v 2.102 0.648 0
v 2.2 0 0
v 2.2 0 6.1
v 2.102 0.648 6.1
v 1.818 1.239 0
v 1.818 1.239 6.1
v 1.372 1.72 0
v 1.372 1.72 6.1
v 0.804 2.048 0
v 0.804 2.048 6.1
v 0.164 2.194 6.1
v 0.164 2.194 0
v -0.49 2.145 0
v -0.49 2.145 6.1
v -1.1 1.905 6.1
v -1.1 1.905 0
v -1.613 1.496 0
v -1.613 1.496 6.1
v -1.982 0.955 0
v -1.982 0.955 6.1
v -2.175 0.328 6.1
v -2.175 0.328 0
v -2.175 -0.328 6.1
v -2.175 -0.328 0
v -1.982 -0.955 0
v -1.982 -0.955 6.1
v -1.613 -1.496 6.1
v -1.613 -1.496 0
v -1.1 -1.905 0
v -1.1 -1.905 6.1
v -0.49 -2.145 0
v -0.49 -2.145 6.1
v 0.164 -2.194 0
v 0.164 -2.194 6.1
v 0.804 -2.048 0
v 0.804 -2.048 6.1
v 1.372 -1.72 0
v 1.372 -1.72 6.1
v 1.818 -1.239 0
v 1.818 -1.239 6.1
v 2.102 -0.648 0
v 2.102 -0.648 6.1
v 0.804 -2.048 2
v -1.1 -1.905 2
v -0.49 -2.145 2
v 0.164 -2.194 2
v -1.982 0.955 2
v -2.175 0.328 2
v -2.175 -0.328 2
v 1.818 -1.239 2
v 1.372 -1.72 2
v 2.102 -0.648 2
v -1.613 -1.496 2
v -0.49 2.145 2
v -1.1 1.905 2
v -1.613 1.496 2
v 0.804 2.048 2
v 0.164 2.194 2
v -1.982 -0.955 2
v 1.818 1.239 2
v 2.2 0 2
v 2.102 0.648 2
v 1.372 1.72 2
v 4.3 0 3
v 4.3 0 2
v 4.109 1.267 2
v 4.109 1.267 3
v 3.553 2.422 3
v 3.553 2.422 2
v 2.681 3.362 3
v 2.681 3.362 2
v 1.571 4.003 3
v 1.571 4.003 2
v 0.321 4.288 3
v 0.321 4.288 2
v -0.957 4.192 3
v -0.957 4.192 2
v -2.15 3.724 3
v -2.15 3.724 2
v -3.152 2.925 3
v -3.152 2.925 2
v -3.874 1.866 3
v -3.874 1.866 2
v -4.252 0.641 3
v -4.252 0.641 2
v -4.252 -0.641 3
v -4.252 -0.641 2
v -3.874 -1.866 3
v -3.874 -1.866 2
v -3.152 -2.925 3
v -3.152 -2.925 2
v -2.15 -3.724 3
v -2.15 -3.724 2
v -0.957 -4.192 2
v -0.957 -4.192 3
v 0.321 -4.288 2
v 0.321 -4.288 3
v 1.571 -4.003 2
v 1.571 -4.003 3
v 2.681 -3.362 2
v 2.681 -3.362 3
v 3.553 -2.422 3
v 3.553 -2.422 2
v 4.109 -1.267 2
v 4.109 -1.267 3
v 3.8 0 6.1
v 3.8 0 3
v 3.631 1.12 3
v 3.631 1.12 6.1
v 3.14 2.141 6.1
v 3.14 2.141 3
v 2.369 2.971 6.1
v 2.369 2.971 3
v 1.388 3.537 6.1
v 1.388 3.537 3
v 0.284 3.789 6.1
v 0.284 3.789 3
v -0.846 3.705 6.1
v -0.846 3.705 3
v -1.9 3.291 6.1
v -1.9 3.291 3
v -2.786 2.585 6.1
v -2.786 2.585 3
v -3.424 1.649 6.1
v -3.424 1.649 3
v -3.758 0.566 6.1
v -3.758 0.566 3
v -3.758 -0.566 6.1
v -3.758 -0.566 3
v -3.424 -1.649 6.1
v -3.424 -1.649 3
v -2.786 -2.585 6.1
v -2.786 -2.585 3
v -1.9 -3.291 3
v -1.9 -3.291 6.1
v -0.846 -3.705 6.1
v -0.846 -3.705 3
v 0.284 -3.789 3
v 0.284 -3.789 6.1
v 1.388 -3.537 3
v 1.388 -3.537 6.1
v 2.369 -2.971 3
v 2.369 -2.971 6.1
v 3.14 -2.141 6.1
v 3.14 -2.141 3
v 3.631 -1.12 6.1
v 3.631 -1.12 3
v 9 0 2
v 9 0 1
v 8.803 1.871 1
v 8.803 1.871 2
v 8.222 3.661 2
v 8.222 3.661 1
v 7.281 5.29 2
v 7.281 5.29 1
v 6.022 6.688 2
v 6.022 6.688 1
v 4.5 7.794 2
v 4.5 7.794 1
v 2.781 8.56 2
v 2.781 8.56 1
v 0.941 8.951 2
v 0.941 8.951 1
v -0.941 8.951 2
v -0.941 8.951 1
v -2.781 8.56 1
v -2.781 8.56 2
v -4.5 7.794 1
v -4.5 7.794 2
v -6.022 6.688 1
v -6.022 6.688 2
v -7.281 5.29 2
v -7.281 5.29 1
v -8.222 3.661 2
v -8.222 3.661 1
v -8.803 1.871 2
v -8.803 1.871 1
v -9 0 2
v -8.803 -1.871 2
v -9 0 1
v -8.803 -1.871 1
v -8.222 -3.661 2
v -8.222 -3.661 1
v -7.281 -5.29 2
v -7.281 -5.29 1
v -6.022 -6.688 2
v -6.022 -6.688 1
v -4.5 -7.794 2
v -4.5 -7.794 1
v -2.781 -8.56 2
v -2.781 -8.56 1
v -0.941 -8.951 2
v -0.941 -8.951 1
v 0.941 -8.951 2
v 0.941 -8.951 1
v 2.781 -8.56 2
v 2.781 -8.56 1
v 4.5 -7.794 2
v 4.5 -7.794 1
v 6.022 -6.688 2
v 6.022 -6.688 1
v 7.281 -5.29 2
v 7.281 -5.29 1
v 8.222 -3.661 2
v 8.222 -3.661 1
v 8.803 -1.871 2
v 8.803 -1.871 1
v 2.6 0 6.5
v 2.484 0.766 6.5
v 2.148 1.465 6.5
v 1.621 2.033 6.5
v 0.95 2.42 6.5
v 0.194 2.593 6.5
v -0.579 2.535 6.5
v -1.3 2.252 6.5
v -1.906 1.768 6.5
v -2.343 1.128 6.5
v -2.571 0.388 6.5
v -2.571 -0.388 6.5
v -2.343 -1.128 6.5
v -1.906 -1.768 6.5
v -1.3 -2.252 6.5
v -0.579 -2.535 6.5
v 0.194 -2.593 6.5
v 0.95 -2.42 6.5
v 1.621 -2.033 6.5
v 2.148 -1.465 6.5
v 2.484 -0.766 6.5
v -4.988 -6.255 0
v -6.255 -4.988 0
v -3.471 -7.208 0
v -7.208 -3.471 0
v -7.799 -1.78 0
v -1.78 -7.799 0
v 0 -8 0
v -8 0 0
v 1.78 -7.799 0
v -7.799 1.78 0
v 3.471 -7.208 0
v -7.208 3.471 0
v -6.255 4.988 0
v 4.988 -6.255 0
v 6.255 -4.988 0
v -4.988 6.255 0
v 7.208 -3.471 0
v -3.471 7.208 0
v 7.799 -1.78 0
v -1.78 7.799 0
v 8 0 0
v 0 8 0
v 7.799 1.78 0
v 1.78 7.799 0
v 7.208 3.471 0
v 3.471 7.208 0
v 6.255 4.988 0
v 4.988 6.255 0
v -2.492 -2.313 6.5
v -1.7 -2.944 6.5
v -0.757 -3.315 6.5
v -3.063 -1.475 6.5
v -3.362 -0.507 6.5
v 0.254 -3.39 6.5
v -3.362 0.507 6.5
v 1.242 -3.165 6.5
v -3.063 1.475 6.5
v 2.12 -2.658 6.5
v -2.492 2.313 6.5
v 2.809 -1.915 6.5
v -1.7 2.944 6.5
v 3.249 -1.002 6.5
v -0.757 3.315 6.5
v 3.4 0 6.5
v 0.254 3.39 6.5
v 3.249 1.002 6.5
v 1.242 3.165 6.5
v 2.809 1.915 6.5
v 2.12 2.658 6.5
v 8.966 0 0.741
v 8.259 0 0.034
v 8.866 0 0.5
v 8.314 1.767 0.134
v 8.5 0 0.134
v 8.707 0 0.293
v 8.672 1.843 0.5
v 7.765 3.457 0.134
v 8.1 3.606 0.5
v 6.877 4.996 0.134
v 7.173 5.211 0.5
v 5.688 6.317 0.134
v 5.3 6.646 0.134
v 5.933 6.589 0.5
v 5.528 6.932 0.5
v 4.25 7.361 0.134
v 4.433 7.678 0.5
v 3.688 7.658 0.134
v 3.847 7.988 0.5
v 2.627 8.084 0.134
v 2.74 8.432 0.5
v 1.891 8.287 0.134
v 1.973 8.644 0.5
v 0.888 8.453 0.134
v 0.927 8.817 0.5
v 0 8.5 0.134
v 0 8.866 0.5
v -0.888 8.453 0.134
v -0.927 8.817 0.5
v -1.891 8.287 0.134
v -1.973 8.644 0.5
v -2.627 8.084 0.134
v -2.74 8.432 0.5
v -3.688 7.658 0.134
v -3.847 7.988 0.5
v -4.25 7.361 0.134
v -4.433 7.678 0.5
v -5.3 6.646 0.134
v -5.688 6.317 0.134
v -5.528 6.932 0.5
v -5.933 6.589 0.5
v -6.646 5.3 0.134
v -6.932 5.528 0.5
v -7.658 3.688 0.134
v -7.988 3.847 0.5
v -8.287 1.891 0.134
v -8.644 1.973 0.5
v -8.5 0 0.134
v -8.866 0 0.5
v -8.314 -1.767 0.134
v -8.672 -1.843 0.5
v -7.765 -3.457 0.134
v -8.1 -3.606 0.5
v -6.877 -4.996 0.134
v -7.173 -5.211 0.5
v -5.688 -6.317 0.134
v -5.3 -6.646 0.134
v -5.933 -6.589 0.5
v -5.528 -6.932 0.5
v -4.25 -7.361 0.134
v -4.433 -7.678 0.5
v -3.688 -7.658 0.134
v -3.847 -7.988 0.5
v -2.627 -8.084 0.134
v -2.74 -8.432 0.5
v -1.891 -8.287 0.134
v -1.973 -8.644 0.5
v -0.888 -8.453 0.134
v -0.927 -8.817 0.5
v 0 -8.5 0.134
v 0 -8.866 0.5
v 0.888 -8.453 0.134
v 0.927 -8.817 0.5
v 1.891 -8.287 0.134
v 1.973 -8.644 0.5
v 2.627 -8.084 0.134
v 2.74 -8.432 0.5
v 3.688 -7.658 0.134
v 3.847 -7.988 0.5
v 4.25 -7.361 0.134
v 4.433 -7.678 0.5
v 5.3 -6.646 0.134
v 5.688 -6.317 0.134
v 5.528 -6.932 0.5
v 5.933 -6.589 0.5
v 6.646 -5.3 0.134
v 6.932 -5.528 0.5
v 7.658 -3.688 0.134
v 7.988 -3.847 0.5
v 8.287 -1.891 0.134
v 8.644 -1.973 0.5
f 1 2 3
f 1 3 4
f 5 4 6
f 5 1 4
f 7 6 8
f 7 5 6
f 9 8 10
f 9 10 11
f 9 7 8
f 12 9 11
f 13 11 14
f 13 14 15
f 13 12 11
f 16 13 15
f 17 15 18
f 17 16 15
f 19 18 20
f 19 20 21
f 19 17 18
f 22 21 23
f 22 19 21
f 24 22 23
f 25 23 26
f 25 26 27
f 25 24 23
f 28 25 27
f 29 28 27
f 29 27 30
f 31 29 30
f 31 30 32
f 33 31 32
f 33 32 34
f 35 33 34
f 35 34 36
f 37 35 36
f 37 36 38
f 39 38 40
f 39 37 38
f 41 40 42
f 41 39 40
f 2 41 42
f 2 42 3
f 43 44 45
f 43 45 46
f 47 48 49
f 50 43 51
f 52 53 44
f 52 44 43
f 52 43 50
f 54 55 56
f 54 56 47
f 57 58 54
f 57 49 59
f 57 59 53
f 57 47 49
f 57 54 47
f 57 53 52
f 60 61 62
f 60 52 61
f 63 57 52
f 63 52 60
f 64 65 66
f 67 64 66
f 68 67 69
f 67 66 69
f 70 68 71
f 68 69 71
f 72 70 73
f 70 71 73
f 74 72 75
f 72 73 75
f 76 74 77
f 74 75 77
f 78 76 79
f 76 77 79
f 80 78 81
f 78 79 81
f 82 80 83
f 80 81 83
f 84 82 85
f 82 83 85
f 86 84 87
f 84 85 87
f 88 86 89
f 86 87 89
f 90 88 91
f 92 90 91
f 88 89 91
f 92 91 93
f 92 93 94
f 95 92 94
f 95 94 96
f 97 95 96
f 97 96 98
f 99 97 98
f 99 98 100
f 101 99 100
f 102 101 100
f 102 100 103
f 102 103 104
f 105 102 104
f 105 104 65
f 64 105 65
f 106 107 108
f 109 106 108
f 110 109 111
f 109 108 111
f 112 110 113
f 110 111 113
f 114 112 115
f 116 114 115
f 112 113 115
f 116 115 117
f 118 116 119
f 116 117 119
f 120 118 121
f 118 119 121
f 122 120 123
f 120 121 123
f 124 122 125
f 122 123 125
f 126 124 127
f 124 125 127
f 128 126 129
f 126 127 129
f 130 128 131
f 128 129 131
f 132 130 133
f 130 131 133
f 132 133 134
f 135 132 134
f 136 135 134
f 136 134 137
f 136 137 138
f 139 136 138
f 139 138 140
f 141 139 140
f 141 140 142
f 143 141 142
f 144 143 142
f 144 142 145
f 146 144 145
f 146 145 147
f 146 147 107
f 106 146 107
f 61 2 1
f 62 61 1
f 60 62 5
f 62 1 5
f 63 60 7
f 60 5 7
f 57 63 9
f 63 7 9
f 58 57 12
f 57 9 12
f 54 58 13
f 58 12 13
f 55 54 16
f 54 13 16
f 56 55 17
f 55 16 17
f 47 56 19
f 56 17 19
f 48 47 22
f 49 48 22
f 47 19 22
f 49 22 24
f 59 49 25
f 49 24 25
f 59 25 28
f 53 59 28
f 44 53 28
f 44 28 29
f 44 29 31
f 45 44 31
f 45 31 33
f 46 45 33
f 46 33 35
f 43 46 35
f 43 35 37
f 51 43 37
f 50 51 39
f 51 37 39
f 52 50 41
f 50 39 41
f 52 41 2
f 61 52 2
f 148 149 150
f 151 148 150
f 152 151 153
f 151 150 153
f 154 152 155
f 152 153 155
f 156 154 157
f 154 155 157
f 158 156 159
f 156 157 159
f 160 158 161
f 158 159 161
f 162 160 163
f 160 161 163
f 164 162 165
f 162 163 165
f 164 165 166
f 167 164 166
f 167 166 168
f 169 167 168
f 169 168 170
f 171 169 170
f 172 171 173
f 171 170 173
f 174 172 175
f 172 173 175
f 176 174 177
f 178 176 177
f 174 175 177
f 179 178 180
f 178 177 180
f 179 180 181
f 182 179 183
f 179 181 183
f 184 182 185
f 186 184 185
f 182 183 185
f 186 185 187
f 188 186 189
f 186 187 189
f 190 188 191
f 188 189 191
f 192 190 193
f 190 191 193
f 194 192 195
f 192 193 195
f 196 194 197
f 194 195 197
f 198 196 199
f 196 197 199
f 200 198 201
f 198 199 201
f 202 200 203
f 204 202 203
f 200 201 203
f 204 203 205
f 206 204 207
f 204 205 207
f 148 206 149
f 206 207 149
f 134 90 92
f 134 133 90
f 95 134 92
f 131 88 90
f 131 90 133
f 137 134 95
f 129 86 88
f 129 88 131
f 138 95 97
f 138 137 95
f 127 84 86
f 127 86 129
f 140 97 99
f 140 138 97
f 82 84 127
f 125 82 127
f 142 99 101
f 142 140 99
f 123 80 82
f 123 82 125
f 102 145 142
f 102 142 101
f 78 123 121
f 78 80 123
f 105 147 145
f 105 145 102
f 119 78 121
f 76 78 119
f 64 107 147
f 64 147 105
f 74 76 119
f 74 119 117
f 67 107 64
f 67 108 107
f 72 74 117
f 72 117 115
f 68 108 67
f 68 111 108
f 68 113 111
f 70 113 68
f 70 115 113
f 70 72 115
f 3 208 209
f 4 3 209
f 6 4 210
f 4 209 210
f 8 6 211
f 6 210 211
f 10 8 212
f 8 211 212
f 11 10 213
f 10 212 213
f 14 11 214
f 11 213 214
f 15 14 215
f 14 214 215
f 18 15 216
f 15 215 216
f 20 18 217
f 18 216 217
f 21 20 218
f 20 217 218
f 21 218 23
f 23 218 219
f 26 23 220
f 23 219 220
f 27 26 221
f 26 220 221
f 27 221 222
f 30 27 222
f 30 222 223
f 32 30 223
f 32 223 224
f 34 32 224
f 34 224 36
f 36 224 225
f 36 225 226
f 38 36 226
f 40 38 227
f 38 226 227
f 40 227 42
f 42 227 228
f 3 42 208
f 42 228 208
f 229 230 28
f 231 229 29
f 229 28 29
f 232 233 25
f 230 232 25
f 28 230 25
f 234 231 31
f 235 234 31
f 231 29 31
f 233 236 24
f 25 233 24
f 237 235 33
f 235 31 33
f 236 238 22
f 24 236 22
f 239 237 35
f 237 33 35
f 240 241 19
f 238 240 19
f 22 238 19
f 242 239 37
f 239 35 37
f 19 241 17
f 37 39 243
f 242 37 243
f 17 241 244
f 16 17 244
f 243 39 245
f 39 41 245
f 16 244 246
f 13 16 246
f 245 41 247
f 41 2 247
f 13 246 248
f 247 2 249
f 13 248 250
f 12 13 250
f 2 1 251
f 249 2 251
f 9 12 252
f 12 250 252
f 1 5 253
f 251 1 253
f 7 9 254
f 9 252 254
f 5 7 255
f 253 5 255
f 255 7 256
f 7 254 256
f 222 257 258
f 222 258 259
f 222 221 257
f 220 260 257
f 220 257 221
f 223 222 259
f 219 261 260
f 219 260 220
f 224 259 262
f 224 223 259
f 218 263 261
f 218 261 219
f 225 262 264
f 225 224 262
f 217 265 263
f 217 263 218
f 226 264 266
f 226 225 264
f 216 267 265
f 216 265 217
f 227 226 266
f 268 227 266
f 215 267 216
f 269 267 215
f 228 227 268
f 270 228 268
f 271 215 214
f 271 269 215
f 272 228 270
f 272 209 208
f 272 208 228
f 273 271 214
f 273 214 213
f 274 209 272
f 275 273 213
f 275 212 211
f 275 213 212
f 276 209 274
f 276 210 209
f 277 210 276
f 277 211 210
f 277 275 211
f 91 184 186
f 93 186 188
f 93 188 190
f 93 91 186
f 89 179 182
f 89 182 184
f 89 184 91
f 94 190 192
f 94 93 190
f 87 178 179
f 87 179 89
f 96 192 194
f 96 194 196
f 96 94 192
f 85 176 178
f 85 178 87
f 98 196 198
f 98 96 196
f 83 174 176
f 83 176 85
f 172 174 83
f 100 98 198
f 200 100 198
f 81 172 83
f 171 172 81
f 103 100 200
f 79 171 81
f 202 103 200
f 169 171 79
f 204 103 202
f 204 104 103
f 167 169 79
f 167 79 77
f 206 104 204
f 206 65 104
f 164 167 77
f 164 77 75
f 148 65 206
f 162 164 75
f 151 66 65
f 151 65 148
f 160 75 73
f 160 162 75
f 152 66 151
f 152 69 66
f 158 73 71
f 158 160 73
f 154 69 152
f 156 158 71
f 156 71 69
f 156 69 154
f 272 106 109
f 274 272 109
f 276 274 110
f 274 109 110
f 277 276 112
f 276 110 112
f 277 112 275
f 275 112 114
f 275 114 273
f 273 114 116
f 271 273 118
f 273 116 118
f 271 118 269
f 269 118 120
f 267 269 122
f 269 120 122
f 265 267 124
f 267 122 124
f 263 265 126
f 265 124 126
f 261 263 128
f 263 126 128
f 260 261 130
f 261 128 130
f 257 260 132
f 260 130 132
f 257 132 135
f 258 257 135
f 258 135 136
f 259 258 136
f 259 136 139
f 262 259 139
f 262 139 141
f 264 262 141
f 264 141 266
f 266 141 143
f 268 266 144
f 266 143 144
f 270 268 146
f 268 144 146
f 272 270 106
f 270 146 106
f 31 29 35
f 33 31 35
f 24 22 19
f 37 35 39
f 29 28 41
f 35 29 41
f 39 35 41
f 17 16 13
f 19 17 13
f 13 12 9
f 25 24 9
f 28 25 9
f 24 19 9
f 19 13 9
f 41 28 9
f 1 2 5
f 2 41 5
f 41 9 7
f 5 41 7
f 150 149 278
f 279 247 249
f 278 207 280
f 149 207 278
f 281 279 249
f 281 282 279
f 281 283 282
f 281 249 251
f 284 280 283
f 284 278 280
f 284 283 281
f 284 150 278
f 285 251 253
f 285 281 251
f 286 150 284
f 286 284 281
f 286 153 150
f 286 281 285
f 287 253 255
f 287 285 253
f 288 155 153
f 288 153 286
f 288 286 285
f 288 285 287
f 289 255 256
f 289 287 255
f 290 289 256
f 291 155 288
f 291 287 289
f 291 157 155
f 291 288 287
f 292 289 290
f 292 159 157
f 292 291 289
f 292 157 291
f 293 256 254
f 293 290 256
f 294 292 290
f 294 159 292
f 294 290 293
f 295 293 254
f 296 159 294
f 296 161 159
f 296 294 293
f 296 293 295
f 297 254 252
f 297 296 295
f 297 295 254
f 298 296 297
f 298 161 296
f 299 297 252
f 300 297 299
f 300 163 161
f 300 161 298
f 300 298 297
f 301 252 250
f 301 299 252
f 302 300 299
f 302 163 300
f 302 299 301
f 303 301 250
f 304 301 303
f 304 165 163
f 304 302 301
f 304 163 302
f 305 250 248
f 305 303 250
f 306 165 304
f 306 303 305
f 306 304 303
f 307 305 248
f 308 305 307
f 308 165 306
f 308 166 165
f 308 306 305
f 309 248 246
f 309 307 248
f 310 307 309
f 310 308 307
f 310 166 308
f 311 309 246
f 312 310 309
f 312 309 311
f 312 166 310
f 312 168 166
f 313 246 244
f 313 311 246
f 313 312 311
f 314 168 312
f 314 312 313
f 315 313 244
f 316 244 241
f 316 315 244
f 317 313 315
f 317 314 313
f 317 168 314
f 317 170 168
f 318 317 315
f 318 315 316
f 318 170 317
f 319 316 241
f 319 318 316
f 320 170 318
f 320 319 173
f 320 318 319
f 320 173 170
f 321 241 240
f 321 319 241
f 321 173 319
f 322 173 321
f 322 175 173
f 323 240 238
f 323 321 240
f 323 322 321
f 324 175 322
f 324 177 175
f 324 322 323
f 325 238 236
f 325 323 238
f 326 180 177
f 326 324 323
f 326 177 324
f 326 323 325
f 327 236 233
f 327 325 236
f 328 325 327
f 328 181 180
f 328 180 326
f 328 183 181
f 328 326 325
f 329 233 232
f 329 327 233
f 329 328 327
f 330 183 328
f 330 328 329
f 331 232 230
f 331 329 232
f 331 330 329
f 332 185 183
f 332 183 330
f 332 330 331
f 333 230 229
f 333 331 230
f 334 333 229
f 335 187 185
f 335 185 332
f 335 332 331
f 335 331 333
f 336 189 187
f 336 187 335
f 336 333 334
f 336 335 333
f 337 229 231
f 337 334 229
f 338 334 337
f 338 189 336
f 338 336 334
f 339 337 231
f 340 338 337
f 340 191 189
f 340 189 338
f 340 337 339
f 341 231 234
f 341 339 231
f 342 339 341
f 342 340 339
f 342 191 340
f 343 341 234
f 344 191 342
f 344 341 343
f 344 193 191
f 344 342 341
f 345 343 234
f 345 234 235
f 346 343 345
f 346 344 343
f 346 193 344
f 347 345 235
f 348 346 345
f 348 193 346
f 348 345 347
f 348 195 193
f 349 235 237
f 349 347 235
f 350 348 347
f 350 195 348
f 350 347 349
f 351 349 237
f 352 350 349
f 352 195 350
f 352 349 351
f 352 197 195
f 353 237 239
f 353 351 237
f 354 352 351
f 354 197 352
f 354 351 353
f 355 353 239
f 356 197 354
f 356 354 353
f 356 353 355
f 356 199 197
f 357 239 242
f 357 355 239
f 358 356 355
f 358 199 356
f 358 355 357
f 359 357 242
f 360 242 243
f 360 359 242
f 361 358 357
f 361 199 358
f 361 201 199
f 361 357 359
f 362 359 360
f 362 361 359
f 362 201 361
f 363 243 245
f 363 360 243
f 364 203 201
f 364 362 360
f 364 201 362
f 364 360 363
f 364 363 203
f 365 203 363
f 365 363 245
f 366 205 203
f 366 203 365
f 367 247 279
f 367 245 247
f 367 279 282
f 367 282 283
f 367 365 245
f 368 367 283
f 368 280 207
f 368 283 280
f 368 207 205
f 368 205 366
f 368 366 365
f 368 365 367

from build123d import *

# Parameters (mm, degrees)
F0_R     = 9
F0_R_2   = 4.3
F1_DEPTH = 2
F0_R_3   = 2.2
F0_R_4   = 3.8
F2_DEPTH = 3
F3_DEPTH = 6.5
F4_R     = 1
F5_SIZE  = 0.4


with BuildPart() as f1:
    # F0 (on Top) → F1 (new body)
    with BuildSketch(Plane.XY):
        Circle(F0_R)
        Circle(F0_R_2, mode=Mode.SUBTRACT)
    extrude(amount=F1_DEPTH)

    # F0 (on Top) → F2 (join)
    with BuildSketch(Plane.XY):
        Circle(F0_R_2)
        Circle(F0_R_4, mode=Mode.SUBTRACT)
    extrude(amount=F2_DEPTH)

    # F0 (on Top) → F3 (join)
    with BuildSketch(Plane.XY):
        Circle(F0_R_4)
        Circle(F0_R_3, mode=Mode.SUBTRACT)
    extrude(amount=F3_DEPTH)

    # F4
    f4_edges = [f1.edges().sort_by_distance(p)[0] for p in [
        (-9, 0, 0),
    ]]
    fillet(f4_edges, radius=F4_R)

    # F5
    f5_edges = [f1.edges().sort_by_distance(p)[0] for p in [
        (-3.8, 0, 6.5),
        (-2.2, 0, 6.5),
    ]]
    chamfer(f5_edges, length=F5_SIZE)


with BuildPart() as f1b:
    # F0 (on Top) → F1, piece 2 (new body)
    with BuildSketch(Plane.XY):
        Circle(F0_R_3)
    extrude(amount=F1_DEPTH)


solid = Compound([f1.part, f1b.part])
